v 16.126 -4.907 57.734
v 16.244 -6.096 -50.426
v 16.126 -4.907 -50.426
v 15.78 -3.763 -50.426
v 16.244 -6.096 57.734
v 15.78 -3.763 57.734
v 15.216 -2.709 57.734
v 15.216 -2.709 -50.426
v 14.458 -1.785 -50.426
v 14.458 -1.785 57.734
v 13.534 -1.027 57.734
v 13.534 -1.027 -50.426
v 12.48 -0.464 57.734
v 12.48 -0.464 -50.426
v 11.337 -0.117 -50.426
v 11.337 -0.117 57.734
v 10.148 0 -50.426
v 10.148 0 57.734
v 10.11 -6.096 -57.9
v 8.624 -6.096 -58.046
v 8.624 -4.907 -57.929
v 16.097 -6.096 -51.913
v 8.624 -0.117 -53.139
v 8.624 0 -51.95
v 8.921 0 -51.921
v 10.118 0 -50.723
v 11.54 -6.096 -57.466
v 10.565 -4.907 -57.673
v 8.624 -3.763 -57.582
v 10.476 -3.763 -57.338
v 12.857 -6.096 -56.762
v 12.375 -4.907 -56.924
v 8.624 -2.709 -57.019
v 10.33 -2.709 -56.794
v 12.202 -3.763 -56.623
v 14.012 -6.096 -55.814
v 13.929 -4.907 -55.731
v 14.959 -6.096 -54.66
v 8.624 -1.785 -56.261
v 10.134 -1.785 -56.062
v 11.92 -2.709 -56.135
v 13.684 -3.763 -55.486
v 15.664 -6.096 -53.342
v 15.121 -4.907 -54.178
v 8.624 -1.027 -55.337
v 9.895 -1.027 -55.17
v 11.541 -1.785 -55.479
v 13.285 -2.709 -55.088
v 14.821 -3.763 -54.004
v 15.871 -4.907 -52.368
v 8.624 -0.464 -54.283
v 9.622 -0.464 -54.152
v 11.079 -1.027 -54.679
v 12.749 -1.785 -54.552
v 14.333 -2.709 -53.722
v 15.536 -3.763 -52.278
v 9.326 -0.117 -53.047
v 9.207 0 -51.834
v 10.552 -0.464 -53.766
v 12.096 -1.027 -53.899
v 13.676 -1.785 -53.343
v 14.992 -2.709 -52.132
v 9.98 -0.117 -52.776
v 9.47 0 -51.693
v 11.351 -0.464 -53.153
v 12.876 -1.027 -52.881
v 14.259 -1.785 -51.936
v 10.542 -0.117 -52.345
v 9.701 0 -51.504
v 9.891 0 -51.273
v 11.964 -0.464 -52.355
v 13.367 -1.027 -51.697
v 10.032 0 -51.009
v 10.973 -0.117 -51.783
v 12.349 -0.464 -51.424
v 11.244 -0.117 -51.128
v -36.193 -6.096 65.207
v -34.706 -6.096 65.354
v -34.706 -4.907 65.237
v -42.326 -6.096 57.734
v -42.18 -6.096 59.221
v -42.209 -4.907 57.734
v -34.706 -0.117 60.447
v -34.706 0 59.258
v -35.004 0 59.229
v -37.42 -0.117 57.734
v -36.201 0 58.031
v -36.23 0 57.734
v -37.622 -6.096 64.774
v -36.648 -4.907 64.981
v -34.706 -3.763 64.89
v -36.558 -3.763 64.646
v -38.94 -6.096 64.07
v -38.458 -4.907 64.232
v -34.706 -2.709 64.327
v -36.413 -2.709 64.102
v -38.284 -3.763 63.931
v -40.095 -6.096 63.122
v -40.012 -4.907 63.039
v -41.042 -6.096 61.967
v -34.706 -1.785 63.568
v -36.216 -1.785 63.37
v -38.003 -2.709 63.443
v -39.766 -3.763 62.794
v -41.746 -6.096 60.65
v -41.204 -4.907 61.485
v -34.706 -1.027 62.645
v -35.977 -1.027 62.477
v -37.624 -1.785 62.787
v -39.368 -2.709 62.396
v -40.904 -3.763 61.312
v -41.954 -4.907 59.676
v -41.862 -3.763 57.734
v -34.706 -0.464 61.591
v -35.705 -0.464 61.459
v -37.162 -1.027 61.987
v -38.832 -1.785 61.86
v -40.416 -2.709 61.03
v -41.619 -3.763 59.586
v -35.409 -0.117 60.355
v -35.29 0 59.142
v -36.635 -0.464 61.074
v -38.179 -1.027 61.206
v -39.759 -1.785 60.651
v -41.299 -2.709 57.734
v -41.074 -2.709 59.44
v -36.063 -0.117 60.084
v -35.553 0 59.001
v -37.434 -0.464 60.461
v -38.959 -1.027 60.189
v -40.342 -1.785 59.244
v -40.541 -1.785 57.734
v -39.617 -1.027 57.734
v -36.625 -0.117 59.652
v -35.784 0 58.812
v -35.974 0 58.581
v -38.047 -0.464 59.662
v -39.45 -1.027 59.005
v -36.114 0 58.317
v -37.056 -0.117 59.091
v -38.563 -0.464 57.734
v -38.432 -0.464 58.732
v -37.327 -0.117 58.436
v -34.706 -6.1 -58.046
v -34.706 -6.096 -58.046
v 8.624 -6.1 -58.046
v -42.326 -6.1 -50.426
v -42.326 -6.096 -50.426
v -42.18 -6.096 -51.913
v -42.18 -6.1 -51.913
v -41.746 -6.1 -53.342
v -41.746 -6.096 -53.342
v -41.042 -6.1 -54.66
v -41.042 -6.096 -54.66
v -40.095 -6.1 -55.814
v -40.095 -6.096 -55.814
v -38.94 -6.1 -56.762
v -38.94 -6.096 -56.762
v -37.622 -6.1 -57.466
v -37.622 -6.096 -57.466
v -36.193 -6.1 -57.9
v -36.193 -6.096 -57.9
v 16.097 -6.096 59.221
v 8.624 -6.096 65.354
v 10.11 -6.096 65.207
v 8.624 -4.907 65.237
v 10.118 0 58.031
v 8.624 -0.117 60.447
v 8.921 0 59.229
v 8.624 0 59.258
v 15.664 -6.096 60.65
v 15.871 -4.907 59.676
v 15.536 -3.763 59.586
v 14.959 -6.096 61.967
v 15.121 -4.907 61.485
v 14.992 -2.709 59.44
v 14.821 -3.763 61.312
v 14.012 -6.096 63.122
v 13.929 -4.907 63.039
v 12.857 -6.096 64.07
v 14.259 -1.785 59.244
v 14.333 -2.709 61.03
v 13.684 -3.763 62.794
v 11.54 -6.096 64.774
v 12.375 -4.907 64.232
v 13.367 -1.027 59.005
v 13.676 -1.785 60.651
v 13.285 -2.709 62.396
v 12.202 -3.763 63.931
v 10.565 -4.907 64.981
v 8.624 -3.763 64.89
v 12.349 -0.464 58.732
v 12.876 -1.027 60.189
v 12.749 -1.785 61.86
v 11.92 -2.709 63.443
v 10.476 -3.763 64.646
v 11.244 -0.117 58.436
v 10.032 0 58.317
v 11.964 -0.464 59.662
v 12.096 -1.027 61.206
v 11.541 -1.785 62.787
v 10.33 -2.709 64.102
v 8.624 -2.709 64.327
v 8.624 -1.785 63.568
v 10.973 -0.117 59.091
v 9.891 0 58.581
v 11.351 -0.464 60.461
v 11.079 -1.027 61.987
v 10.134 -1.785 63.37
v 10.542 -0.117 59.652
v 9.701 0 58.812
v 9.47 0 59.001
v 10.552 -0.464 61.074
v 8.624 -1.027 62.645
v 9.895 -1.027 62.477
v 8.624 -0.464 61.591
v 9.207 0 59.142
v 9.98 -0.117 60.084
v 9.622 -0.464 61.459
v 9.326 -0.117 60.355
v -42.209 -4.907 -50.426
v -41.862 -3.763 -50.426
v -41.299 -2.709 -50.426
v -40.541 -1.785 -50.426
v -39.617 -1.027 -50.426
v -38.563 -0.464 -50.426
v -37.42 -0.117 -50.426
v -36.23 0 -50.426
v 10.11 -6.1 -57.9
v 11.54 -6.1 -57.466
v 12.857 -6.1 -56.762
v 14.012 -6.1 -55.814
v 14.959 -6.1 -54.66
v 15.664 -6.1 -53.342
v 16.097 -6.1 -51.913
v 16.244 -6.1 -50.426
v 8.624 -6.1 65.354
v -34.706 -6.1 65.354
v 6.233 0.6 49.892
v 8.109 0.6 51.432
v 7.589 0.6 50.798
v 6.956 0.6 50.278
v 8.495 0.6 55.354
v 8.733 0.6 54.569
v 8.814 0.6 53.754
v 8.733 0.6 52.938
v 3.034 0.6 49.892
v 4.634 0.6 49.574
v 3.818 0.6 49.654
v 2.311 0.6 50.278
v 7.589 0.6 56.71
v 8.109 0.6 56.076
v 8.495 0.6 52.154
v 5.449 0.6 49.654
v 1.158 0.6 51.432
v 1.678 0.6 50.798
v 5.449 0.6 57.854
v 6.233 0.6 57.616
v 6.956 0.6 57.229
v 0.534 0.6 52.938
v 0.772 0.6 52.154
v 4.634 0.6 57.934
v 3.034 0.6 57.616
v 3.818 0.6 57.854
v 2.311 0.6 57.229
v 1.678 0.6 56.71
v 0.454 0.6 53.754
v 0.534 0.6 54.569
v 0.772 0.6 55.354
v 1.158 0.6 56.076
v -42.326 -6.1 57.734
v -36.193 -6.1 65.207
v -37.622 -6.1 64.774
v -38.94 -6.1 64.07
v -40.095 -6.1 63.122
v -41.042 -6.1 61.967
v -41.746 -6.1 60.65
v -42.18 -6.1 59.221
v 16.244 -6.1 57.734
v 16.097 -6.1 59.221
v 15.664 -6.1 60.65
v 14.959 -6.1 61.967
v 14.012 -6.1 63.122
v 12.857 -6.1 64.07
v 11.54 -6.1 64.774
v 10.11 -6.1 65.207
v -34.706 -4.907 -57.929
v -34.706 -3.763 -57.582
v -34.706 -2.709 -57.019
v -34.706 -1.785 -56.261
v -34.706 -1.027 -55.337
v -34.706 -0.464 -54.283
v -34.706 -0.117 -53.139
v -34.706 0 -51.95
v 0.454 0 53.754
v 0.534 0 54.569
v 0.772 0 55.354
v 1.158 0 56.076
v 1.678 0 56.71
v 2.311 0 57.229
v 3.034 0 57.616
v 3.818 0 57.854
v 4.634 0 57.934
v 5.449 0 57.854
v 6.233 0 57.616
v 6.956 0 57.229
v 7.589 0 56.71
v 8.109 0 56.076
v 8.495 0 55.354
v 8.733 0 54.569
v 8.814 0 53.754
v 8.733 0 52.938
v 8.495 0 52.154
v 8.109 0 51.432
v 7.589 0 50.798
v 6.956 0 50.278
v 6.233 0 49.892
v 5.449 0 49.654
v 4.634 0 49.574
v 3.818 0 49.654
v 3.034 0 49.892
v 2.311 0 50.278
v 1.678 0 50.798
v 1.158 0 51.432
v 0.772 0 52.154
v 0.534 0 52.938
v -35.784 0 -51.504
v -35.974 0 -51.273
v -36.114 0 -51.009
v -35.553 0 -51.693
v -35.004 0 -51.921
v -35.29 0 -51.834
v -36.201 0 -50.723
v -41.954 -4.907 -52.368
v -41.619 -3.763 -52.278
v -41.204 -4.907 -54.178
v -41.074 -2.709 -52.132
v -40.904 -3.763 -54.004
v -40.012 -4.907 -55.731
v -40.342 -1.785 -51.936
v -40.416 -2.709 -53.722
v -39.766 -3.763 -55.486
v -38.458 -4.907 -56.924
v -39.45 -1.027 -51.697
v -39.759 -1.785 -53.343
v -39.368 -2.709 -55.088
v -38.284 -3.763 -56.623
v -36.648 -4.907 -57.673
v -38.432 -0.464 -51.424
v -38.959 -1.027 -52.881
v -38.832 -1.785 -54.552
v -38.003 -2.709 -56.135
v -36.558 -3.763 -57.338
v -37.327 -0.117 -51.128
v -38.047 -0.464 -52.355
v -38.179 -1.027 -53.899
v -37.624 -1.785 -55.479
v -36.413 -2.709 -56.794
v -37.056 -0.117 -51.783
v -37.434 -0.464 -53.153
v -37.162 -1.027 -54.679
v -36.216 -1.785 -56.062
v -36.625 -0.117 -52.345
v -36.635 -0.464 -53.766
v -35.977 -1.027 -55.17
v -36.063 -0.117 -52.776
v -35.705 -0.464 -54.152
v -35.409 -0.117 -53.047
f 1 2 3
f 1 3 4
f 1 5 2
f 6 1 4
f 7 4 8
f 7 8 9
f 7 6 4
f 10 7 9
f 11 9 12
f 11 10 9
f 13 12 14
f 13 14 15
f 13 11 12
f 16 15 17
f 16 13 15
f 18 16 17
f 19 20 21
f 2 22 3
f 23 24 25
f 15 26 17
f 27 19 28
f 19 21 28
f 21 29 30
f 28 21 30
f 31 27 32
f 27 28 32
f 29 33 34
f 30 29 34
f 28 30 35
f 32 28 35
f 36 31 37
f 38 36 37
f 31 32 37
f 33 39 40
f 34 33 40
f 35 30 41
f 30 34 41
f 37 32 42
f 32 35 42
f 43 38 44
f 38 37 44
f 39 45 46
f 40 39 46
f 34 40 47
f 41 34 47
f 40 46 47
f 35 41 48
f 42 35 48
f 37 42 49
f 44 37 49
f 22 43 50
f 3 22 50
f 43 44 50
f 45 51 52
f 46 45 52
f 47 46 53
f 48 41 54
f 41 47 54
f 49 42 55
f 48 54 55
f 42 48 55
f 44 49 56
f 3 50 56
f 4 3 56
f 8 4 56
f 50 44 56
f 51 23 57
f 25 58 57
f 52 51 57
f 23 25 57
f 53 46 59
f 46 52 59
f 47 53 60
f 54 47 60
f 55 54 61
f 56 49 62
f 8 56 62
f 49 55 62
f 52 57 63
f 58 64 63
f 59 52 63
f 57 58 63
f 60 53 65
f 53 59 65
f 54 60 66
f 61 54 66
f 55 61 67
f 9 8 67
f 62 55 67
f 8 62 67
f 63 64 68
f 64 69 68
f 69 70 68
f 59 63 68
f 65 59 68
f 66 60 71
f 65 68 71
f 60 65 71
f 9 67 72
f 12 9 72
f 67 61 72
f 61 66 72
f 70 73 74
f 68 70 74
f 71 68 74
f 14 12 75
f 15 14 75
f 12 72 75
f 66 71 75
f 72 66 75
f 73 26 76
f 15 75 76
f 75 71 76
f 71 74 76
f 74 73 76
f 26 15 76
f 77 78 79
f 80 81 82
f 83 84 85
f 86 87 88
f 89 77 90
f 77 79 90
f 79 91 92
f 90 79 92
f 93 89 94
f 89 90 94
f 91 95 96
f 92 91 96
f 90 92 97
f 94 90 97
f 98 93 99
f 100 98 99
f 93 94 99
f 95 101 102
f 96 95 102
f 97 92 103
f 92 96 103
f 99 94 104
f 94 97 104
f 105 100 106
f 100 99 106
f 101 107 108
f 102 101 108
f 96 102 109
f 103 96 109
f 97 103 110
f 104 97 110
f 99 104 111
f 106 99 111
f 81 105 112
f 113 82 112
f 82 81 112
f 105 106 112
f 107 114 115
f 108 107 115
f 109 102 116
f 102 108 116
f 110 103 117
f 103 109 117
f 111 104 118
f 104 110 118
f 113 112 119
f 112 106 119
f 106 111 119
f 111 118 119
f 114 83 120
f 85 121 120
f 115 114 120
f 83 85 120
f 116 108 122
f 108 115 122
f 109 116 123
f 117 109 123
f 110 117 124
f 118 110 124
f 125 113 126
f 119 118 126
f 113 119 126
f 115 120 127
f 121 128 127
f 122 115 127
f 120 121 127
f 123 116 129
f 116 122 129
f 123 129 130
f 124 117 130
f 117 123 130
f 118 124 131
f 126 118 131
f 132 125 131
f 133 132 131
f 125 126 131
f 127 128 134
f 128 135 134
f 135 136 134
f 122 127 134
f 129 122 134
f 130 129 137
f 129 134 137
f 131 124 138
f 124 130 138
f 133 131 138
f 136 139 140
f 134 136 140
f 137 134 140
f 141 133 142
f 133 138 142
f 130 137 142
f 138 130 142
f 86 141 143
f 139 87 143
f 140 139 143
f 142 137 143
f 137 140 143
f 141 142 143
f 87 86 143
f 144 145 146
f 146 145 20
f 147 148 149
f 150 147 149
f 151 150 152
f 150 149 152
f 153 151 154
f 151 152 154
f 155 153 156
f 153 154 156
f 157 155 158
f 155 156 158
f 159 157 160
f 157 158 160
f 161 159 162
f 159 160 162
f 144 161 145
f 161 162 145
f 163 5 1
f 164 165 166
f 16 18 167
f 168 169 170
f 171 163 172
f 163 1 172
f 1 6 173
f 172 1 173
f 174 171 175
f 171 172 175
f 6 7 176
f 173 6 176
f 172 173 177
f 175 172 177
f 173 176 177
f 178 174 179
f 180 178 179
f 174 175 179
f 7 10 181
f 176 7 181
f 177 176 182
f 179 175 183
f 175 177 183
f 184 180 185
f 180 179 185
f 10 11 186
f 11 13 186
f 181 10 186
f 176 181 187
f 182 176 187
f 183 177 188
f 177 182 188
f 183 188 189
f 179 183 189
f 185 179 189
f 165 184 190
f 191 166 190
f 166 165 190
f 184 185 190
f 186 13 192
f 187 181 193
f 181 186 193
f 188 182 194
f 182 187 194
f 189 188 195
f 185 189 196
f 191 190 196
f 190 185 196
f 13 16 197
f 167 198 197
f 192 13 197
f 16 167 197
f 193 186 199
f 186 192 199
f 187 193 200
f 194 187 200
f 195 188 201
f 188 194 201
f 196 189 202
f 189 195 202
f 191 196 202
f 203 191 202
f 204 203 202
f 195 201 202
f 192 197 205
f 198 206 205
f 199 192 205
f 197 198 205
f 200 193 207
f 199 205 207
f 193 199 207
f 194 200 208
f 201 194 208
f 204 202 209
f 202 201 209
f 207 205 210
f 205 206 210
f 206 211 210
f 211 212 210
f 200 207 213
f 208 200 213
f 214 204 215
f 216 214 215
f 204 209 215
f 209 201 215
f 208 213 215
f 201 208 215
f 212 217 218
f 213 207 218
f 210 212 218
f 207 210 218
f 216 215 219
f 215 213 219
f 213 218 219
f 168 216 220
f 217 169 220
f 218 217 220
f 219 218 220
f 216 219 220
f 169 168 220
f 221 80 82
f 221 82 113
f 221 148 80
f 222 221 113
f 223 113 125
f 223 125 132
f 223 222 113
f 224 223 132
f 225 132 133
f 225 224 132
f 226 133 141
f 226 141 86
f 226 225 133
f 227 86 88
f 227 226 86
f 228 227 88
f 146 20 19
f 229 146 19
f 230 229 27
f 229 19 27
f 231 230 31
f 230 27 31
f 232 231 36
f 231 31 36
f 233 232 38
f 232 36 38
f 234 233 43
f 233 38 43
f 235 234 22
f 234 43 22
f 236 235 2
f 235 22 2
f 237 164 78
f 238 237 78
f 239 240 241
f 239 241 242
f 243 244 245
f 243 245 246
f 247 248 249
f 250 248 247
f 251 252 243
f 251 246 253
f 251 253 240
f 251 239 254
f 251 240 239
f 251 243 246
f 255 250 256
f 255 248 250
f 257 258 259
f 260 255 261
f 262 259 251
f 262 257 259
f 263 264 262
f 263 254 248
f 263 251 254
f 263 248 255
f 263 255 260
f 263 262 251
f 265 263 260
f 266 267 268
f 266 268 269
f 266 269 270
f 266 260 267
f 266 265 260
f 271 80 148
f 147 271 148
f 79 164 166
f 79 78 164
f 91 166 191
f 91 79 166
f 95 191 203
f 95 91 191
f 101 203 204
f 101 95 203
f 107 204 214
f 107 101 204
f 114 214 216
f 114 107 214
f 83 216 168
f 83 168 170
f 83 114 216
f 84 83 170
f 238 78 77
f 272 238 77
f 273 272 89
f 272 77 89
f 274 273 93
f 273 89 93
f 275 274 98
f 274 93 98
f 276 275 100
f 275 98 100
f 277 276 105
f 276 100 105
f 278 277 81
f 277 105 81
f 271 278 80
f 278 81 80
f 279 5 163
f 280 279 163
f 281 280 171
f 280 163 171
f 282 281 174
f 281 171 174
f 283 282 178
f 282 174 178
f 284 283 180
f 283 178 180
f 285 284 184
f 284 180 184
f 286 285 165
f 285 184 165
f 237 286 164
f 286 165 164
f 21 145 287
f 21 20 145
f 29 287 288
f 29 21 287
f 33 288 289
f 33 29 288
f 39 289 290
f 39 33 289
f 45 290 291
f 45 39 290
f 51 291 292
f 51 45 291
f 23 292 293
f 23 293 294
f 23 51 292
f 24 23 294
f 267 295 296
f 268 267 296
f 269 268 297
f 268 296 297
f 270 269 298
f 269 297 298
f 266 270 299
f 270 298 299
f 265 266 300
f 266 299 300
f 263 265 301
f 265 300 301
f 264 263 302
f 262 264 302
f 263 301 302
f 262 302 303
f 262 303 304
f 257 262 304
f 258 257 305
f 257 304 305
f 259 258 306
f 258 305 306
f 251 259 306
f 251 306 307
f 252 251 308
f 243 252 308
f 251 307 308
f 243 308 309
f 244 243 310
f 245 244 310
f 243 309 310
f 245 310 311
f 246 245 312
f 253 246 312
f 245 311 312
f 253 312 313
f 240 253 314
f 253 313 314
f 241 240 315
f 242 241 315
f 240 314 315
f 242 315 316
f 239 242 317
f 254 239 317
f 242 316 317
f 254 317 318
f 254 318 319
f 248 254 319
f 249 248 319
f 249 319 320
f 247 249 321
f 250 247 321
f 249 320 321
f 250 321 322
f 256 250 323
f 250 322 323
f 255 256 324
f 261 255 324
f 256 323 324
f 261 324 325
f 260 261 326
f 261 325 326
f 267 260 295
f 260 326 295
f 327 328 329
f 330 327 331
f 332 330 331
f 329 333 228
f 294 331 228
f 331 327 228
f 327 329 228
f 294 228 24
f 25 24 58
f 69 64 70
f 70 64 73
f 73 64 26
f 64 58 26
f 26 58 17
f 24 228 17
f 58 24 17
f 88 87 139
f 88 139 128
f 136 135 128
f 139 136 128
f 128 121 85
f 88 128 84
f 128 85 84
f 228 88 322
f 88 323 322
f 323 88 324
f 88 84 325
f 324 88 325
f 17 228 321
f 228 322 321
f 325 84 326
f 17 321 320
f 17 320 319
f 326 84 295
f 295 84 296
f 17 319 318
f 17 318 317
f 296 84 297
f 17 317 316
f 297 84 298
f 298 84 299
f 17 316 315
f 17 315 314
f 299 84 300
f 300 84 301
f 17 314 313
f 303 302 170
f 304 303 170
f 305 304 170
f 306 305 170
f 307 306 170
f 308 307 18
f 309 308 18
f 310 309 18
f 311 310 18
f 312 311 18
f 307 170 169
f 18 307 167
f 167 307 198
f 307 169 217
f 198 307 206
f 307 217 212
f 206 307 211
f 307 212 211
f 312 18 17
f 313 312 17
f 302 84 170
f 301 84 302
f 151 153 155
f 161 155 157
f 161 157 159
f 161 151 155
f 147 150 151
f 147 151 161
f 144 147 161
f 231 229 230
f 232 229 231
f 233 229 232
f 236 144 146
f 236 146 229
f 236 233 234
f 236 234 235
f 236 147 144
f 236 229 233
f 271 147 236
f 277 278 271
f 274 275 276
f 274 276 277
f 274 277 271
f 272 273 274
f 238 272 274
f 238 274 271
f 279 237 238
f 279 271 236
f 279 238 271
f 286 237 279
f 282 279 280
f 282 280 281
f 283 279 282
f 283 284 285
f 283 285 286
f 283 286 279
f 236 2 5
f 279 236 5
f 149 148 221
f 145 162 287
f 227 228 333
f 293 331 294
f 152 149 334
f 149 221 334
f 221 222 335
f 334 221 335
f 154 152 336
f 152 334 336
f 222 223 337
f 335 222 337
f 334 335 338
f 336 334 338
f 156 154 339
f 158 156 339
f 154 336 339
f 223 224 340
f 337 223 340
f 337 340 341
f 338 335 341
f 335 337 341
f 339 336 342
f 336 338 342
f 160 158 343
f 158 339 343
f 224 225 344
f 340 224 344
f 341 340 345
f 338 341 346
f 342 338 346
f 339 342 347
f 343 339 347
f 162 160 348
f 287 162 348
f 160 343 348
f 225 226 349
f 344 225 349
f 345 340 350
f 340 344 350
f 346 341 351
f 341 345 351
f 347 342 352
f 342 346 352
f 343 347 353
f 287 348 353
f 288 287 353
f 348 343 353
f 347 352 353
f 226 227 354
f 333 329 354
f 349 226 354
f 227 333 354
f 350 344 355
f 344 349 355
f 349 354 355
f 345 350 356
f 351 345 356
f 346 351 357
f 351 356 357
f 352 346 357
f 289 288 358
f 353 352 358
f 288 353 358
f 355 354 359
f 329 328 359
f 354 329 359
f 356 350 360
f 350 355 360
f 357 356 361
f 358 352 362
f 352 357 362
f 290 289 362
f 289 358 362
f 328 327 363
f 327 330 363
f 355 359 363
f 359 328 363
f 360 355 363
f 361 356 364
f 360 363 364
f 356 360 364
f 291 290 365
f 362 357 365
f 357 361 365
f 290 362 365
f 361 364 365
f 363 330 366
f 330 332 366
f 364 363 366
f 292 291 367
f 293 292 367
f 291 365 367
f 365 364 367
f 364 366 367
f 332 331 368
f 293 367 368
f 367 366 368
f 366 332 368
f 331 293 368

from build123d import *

# Parameters (mm, degrees)
F1_DEPTH = 6.1
F2_R     = 6.096
F3_R     = 4.18
F4_DEPTH = 0.6


with BuildPart() as f1:
    # F0 (on Front) → F1 (new body)
    with BuildSketch(Plane.XZ):
        with BuildLine():
            Line((8.623609, 65.353912), (-34.706391, 65.353912))
            ThreePointArc((-34.706391, 65.353912), (-40.094544, 63.122066), (-42.326391, 57.733912))
            Line((-42.326391, 57.733912), (-42.326391, -50.426088))
            ThreePointArc((-42.326391, -50.426088), (-40.094544, -55.814242), (-34.706391, -58.046088))
            Line((-34.706391, -58.046088), (8.623609, -58.046088))
            ThreePointArc((8.623609, -58.046088), (14.011763, -55.814242), (16.243609, -50.426088))
            Line((16.243609, -50.426088), (16.243609, 57.733912))
            ThreePointArc((16.243609, 57.733912), (14.011763, 63.122066), (8.623609, 65.353912))
        make_face()
    extrude(amount=F1_DEPTH)

    # F2
    f2_edges = [f1.edges().sort_by_distance(p)[0] for p in [
        (16.243609, 0, 3.653912),
        (14.011763, 0, 63.122066),
        (-13.041391, 0, 65.353912),
        (-40.094544, 0, 63.122066),
        (-42.326391, 0, 3.653912),
        (-40.094544, 0, -55.814242),
        (-13.041391, 0, -58.046088),
        (14.011763, 0, -55.814242),
    ]]
    fillet(f2_edges, radius=F2_R)

    # F3 (on face) → F4 (join)
    with BuildSketch(Plane(origin=(0, 0, 0), x_dir=(-1, 0, 0), z_dir=(0, 1, 0))):
        with Locations((-4.633609, 53.753912)):
            Circle(F3_R)
    extrude(amount=F4_DEPTH)


solid = f1.part
